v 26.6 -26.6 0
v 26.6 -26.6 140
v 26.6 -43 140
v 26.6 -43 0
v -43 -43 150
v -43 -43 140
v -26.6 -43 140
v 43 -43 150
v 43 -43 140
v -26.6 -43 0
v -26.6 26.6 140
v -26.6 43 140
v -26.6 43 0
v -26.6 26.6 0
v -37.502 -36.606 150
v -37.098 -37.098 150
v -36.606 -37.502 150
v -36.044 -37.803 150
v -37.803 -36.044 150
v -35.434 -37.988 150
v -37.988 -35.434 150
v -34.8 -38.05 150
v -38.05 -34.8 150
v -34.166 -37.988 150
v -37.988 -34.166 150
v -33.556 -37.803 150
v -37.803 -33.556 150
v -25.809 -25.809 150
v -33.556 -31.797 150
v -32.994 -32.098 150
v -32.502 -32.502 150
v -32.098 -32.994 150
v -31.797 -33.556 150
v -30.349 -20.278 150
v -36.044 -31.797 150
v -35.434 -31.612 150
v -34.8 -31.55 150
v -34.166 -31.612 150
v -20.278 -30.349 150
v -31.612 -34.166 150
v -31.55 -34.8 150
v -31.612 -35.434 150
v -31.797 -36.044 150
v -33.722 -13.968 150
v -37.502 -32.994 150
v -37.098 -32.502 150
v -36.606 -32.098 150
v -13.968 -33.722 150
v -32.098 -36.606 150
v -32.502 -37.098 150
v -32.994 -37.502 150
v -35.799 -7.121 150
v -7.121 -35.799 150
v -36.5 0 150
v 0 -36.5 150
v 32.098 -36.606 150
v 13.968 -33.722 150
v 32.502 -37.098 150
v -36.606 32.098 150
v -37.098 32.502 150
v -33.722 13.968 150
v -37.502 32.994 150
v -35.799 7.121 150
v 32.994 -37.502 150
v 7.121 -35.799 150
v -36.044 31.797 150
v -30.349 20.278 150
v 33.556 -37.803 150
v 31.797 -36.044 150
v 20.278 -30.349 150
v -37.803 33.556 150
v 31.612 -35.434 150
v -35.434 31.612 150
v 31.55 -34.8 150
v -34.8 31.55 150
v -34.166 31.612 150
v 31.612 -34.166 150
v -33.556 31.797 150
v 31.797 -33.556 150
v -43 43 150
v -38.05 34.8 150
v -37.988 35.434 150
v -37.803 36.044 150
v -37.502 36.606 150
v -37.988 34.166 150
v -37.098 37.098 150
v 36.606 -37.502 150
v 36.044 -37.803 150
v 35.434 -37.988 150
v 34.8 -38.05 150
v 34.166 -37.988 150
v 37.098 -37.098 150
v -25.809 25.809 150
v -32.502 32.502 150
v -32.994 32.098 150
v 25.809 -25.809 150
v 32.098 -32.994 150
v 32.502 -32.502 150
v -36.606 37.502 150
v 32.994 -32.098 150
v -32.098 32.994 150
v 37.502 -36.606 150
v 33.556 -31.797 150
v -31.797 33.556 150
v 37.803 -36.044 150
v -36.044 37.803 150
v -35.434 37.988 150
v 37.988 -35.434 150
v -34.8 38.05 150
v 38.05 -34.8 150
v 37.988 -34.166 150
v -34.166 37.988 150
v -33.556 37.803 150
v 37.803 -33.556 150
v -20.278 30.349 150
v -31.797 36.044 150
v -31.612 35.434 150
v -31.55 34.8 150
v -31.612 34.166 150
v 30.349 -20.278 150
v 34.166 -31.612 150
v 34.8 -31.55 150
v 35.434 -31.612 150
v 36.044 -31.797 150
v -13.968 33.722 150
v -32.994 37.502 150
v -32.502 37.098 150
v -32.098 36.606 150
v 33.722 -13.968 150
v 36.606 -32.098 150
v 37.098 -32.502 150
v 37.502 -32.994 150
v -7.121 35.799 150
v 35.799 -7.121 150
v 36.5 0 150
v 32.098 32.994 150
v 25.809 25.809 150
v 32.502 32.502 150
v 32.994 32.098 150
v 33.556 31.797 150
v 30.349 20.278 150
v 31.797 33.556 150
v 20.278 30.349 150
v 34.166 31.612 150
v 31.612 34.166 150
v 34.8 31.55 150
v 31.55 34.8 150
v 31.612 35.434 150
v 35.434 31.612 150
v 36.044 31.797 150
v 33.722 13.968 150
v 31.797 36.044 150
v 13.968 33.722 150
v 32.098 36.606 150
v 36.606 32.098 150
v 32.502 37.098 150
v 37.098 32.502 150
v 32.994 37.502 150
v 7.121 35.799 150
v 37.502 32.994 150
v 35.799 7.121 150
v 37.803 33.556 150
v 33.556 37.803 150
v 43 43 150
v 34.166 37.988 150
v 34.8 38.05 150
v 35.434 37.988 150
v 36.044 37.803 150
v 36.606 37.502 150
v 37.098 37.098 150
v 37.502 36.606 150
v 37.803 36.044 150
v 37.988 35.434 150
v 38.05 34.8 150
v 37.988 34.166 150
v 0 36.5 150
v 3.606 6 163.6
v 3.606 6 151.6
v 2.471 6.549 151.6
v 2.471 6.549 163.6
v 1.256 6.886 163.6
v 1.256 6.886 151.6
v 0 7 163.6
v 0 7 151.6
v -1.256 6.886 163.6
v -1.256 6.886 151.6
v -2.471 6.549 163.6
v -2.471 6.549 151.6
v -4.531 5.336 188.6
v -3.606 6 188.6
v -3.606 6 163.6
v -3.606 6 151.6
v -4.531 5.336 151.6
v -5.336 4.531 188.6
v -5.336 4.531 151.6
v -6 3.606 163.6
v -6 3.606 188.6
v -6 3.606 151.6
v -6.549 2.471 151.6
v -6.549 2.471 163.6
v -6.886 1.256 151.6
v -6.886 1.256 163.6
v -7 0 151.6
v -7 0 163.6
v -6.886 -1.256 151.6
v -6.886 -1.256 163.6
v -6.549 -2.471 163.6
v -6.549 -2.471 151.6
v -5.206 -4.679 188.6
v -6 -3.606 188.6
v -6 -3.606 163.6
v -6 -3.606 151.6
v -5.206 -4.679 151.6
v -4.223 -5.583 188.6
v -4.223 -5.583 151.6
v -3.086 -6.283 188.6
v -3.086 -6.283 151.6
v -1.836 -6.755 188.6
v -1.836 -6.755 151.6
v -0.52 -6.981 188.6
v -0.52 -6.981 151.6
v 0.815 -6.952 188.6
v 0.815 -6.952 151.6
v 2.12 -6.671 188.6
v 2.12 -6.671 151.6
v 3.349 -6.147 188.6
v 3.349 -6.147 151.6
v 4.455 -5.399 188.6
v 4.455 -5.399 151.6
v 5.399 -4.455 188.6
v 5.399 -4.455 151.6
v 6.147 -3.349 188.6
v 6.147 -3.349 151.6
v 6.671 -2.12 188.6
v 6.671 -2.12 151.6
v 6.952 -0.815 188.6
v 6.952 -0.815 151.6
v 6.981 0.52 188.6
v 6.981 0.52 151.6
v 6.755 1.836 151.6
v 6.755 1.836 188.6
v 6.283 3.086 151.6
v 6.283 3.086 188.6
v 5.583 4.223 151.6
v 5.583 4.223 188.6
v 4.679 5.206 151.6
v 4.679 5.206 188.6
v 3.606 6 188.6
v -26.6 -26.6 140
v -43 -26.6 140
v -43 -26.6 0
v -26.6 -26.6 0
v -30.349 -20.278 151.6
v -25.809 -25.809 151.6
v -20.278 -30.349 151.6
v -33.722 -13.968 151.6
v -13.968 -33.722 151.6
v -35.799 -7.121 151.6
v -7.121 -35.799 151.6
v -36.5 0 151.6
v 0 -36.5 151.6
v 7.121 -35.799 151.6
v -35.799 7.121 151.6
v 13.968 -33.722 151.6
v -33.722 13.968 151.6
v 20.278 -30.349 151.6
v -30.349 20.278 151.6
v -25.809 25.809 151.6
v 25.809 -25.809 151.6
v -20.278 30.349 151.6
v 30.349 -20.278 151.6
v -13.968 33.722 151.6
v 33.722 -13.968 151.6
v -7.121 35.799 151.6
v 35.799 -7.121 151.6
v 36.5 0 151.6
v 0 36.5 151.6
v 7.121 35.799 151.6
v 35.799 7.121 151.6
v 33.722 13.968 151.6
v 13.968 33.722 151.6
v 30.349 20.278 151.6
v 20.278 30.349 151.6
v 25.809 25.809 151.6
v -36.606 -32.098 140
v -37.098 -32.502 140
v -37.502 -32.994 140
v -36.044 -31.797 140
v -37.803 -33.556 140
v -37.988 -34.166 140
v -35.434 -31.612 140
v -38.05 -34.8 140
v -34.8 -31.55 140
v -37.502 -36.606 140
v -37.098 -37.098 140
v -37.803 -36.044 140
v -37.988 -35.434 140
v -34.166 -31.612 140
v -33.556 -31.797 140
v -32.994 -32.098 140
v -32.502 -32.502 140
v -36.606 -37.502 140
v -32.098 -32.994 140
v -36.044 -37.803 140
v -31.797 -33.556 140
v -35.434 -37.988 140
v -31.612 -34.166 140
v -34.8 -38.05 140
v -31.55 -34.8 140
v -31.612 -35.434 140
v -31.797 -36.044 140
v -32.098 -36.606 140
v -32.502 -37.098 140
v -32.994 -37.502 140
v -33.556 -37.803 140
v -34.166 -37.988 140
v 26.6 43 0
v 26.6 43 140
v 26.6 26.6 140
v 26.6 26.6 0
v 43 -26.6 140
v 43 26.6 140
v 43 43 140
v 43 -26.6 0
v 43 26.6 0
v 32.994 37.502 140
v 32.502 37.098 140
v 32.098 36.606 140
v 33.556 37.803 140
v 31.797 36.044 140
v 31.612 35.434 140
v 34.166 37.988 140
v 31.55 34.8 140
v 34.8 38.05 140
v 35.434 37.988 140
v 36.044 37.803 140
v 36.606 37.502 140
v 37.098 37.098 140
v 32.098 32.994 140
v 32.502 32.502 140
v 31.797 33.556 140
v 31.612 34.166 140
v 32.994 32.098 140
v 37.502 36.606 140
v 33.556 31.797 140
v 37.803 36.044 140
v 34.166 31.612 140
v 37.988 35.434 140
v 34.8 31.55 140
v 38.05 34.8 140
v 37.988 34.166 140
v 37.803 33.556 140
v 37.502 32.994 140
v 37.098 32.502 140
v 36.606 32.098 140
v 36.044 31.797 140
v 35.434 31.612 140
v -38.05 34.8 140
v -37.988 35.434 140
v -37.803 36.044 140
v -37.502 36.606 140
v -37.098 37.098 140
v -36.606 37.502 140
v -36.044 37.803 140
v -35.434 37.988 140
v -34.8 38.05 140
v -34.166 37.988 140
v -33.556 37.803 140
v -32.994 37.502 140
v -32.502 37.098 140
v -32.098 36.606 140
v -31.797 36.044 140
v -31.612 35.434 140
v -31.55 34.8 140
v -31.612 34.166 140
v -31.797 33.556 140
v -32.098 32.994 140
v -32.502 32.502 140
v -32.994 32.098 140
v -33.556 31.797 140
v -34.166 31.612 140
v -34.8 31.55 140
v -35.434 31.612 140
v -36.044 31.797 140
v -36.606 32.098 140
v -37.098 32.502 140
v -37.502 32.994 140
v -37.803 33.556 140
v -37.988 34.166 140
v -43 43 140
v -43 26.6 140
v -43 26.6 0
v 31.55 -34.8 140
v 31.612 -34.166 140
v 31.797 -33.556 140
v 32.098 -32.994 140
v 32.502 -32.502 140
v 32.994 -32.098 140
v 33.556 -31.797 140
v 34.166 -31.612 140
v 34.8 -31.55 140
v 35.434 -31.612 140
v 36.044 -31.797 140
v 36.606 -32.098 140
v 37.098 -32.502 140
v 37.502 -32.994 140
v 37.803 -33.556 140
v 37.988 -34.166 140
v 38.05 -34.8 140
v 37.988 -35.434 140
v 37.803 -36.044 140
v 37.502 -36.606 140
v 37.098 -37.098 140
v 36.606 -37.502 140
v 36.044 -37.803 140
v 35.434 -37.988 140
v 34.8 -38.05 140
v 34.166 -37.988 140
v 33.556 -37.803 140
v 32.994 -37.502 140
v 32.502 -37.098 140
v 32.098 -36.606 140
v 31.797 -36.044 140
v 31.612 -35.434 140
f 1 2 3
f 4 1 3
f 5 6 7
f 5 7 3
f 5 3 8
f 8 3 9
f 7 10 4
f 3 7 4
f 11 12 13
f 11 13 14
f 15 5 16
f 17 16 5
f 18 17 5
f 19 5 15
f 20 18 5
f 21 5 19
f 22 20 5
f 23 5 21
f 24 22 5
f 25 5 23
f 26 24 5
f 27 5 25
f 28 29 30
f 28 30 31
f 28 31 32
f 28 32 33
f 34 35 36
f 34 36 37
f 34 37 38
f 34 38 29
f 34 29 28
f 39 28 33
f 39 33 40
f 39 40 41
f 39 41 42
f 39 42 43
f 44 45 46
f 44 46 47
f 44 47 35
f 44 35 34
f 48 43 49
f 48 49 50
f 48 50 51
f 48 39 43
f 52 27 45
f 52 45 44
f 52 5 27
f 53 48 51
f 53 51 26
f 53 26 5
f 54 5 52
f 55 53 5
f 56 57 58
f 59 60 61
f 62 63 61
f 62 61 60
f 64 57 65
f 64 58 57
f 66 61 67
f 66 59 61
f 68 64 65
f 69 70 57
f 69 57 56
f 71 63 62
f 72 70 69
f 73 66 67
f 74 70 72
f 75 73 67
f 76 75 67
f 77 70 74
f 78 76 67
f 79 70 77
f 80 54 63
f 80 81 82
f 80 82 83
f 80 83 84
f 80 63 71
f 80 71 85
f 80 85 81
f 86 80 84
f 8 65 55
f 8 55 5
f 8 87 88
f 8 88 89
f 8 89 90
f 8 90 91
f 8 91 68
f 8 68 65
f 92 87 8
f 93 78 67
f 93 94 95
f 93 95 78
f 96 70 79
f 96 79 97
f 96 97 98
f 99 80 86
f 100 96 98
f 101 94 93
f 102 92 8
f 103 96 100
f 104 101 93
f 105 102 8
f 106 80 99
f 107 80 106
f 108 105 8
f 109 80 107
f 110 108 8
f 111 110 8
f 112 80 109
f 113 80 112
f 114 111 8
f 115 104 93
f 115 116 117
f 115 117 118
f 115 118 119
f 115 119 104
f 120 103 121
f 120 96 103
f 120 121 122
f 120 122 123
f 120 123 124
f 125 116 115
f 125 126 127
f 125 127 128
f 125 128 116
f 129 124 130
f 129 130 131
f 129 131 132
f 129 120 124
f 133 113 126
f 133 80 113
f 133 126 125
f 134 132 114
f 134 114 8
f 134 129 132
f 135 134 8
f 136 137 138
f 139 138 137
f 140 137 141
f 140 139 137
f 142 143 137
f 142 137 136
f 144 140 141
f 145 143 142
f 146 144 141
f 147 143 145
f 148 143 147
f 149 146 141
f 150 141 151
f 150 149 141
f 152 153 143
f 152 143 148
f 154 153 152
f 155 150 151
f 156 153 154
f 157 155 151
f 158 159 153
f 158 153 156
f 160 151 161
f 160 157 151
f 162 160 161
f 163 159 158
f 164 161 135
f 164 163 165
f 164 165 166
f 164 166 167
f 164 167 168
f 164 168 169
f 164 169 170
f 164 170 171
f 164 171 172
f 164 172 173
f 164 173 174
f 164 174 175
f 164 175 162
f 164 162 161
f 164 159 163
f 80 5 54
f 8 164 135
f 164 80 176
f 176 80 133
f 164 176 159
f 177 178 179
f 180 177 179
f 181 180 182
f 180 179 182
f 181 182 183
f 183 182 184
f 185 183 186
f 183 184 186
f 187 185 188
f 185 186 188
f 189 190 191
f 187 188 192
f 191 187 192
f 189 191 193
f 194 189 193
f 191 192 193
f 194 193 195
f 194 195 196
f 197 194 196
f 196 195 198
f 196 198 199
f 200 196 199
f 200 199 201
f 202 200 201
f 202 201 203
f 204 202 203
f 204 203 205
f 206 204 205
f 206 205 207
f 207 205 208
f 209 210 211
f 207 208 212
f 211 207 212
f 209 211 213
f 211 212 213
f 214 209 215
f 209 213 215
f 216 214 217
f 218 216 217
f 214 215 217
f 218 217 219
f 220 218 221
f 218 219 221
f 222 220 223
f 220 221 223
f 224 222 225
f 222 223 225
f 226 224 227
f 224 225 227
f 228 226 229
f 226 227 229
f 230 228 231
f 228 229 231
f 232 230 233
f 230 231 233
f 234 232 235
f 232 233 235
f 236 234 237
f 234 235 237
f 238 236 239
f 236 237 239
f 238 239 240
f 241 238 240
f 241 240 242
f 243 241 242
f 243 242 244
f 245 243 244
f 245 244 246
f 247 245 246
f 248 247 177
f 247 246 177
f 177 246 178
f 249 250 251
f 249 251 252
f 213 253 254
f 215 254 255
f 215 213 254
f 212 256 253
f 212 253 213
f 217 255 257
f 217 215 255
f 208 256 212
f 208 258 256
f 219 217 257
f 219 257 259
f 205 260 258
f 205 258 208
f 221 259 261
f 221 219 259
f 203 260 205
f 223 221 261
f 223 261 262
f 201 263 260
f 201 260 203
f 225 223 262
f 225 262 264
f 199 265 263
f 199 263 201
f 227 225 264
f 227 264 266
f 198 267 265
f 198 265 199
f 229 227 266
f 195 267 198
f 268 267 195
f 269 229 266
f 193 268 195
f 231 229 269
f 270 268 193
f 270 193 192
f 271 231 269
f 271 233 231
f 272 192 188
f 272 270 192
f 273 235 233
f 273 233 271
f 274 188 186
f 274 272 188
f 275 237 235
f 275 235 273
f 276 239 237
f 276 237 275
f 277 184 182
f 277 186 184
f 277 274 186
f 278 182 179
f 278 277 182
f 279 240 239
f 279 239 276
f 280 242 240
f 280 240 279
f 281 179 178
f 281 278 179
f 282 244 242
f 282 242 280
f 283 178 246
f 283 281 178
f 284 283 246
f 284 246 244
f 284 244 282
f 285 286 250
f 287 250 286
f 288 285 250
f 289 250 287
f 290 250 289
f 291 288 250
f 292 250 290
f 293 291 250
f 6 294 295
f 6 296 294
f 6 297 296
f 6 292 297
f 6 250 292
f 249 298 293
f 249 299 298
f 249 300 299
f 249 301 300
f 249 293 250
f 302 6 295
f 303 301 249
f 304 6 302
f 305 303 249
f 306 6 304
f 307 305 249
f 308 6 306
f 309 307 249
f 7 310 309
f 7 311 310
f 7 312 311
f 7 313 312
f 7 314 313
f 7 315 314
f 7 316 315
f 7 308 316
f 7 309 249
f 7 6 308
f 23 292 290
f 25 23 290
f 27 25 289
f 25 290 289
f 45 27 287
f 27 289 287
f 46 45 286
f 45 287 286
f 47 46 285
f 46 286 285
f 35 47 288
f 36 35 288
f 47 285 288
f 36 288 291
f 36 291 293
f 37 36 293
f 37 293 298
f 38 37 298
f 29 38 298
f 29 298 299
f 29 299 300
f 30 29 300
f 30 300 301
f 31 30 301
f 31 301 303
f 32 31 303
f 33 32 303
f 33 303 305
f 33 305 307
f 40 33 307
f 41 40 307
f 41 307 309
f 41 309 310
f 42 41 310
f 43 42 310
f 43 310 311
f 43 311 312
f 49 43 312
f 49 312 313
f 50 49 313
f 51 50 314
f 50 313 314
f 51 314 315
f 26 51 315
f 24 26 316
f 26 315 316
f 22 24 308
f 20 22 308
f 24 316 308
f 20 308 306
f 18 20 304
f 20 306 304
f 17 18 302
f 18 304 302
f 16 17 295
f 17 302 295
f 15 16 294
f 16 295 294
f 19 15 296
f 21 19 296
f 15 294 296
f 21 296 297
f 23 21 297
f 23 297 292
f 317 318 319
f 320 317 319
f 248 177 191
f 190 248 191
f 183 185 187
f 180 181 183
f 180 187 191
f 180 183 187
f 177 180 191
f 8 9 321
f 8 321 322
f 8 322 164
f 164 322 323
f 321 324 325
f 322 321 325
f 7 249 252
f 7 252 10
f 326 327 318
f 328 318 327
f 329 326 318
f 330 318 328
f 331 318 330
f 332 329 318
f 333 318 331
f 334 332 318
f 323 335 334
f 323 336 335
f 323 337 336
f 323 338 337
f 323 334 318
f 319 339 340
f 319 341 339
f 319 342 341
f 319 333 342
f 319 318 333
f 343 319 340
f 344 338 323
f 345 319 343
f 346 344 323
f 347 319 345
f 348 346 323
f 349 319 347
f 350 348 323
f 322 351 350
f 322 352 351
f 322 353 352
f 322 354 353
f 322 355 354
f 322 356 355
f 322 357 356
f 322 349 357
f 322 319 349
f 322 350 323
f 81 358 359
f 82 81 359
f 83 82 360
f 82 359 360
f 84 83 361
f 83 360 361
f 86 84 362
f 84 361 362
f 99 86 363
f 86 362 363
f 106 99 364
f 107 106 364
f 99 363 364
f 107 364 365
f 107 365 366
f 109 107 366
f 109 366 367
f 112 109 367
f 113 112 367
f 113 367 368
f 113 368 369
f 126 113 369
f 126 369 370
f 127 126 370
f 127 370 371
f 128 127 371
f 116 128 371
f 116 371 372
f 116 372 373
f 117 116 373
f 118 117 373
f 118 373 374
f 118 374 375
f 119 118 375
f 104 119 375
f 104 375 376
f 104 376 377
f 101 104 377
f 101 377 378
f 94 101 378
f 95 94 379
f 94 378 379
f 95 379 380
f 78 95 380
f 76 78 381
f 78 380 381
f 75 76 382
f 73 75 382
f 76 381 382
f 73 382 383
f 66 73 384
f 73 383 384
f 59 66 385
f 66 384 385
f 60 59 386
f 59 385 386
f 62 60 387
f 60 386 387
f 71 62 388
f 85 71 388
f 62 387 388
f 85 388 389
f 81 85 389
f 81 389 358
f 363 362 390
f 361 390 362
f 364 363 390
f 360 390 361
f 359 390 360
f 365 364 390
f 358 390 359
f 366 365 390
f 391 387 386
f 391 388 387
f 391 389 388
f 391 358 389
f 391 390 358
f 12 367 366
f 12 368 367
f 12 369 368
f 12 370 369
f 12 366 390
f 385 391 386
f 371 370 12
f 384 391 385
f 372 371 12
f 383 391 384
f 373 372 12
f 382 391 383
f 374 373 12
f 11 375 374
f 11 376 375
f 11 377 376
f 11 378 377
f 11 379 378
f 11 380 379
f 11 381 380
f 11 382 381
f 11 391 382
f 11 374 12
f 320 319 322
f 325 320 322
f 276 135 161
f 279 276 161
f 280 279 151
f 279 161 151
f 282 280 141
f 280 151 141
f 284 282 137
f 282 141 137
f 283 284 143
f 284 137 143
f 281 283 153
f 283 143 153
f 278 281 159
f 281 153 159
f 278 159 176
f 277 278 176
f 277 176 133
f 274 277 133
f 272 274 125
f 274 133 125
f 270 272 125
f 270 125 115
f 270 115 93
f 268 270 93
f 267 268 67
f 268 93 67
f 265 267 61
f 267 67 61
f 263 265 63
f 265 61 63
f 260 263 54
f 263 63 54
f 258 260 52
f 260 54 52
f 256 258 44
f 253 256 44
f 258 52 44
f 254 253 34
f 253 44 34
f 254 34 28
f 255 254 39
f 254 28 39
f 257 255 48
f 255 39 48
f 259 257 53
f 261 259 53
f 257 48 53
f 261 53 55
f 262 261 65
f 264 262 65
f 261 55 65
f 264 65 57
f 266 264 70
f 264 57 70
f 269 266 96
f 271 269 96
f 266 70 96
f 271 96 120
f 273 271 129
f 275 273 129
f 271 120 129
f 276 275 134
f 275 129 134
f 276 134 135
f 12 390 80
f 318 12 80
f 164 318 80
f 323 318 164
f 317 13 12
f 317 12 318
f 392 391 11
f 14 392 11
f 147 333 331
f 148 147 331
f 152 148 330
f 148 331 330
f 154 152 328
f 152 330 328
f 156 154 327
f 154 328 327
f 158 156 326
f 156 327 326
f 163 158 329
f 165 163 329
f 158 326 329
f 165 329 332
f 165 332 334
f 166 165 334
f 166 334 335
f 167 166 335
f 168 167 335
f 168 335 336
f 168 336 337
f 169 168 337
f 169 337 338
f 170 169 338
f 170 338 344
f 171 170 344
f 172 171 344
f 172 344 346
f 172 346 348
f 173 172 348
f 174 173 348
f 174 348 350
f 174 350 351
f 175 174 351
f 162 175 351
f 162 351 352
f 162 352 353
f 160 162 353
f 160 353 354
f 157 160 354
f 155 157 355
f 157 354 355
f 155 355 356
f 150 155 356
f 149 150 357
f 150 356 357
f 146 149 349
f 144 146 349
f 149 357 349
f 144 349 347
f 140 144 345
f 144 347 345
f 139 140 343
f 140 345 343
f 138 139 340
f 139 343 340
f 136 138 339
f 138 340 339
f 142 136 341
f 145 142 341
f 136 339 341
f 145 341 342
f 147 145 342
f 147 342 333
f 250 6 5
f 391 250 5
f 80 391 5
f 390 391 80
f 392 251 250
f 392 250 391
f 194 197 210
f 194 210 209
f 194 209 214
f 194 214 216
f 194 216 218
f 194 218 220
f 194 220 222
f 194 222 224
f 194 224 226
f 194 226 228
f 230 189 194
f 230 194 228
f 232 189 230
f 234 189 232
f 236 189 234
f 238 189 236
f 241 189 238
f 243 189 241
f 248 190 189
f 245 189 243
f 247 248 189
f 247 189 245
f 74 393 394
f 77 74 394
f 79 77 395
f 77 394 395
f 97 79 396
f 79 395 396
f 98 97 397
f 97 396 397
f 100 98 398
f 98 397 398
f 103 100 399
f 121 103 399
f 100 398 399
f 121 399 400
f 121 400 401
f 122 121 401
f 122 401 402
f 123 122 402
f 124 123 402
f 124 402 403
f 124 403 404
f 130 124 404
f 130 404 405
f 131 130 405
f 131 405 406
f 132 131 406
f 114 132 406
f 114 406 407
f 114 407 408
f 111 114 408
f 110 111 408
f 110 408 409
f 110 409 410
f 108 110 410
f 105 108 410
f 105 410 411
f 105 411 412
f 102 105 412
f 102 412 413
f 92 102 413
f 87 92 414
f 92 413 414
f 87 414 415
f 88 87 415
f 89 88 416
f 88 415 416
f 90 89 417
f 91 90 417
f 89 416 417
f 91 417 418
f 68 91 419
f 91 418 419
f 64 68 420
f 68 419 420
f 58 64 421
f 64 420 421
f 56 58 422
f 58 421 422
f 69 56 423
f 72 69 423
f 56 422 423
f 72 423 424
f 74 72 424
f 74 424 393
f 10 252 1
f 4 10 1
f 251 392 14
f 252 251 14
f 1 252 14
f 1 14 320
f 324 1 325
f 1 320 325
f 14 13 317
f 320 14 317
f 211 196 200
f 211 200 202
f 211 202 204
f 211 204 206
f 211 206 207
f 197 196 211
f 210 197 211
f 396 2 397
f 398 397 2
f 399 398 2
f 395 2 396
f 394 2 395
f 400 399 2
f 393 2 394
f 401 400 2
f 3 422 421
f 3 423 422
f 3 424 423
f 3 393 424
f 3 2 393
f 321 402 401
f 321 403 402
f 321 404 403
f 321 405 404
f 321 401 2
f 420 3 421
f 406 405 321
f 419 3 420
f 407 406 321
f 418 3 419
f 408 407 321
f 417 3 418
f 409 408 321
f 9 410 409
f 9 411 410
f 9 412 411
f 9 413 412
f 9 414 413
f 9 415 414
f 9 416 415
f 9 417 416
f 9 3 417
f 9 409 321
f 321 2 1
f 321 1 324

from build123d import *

# Parameters (mm, degrees)
F0_W      = 86
F0_H      = 86
F1_DEPTH  = 150
F3_D      = 6.5
F4_R      = 36.5
F5_DEPTH  = 1.6
F7_DEPTH  = 12
F9_DEPTH  = 25
F10_W     = 16.4
F10_H     = 16.4
F10_R     = 3.25
F11_DEPTH = 140


with BuildPart() as f1:
    # F0 (on Top) → F1 (new body)
    with BuildSketch(Plane.XY):
        Rectangle(F0_W, F0_H)
    extrude(amount=F1_DEPTH)

    # F3 (through all)
    with Locations(Plane.XY.offset(150)):
        with Locations((-34.8, 34.8), (34.8, 34.8), (34.8, -34.8), (-34.8, -34.8)):
            Hole(F3_D / 2)

    # F4 (on face) → F5 (join)
    with BuildSketch(Plane.XY.offset(150)):
        Circle(F4_R)
    extrude(amount=F5_DEPTH)

    # F6 (on face) → F7 (join)
    with BuildSketch(Plane.XY.offset(151.6)):
        with BuildLine():
            Line((0, 6), (3.6055512755, 6))
            ThreePointArc((3.6055512755, 6), (0, 7), (-3.6055512755, 6))
            Line((-3.6055512755, 6), (0, 6))
        make_face()
        with BuildLine():
            ThreePointArc((-6, 3.6055512755), (-7, 0), (-6, -3.6055512755))
            Line((-6, -3.6055512755), (-6, 0))
            Line((-6, 0), (-6, 3.6055512755))
        make_face()
        with BuildLine():
            Line((0, 0), (0, -7))
            ThreePointArc((0, -7), (4.9497474683, -4.9497474683), (7, 0))
            Line((7, 0), (0, 0))
        make_face()
        with BuildLine():
            Line((0, 0), (7, 0))
            ThreePointArc((7, 0), (6.0925716626, 3.4468203516), (3.6055512755, 6))
            Line((3.6055512755, 6), (0, 6))
            Line((0, 6), (0, 0))
        make_face()
        with BuildLine():
            ThreePointArc((-6, -3.6055512755), (-3.4468203516, -6.0925716626), (0, -7))
            Line((0, -7), (0, 0))
            Line((0, 0), (-6, 0))
            Line((-6, 0), (-6, -3.6055512755))
        make_face()
        with BuildLine():
            Line((-6, 0), (0, 0))
            Line((0, 0), (0, 6))
            Line((0, 6), (-3.6055512755, 6))
            ThreePointArc((-3.6055512755, 6), (-4.9497474683, 4.9497474683), (-6, 3.6055512755))
            Line((-6, 3.6055512755), (-6, 0))
        make_face()
    extrude(amount=F7_DEPTH)

    # F8 (on face) → F9 (join)
    with BuildSketch(Plane.XY.offset(163.6)):
        with BuildLine():
            ThreePointArc((0, -7), (4.9497474683, -4.9497474683), (7, 0))
            Line((7, 0), (0, 0))
            Line((0, 0), (0, -7))
        make_face()
        with BuildLine():
            Line((0, 0), (7, 0))
            ThreePointArc((7, 0), (6.0925716626, 3.4468203516), (3.6055512755, 6))
            Line((3.6055512755, 6), (0, 6))
            Line((0, 6), (0, 0))
        make_face()
        with BuildLine():
            ThreePointArc((-6, -3.6055512755), (-3.4468203516, -6.0925716626), (0, -7))
            Line((0, -7), (0, 0))
            Line((0, 0), (-6, 0))
            Line((-6, 0), (-6, -3.6055512755))
        make_face()
        with BuildLine():
            Line((-6, 0), (0, 0))
            Line((0, 0), (0, 6))
            Line((0, 6), (-3.6055512755, 6))
            ThreePointArc((-3.6055512755, 6), (-4.9497474683, 4.9497474683), (-6, 3.6055512755))
            Line((-6, 3.6055512755), (-6, 0))
        make_face()
    extrude(amount=F9_DEPTH)

    # F10 (on face) → F11 (cut)
    with BuildSketch(Plane(origin=(0, 0, 0), x_dir=(1, 0, 0), z_dir=(0, 0, -1))):
        with Locations((-34.8, 34.8)):
            Rectangle(F10_W, F10_H)
        with Locations((-34.8, 34.8)):
            Circle(F10_R, mode=Mode.SUBTRACT)
        with Locations((34.8, 34.8)):
            Rectangle(F10_W, F10_H)
        with Locations((34.8, 34.8)):
            Circle(F10_R, mode=Mode.SUBTRACT)
        with Locations((34.8, -34.8)):
            Rectangle(F10_W, F10_H)
        with Locations((34.8, -34.8)):
            Circle(F10_R, mode=Mode.SUBTRACT)
        with Locations((-34.8, -34.8)):
            Rectangle(F10_W, F10_H)
        with Locations((-34.8, -34.8)):
            Circle(F10_R, mode=Mode.SUBTRACT)
    extrude(amount=-F11_DEPTH, mode=Mode.SUBTRACT)


solid = f1.part
